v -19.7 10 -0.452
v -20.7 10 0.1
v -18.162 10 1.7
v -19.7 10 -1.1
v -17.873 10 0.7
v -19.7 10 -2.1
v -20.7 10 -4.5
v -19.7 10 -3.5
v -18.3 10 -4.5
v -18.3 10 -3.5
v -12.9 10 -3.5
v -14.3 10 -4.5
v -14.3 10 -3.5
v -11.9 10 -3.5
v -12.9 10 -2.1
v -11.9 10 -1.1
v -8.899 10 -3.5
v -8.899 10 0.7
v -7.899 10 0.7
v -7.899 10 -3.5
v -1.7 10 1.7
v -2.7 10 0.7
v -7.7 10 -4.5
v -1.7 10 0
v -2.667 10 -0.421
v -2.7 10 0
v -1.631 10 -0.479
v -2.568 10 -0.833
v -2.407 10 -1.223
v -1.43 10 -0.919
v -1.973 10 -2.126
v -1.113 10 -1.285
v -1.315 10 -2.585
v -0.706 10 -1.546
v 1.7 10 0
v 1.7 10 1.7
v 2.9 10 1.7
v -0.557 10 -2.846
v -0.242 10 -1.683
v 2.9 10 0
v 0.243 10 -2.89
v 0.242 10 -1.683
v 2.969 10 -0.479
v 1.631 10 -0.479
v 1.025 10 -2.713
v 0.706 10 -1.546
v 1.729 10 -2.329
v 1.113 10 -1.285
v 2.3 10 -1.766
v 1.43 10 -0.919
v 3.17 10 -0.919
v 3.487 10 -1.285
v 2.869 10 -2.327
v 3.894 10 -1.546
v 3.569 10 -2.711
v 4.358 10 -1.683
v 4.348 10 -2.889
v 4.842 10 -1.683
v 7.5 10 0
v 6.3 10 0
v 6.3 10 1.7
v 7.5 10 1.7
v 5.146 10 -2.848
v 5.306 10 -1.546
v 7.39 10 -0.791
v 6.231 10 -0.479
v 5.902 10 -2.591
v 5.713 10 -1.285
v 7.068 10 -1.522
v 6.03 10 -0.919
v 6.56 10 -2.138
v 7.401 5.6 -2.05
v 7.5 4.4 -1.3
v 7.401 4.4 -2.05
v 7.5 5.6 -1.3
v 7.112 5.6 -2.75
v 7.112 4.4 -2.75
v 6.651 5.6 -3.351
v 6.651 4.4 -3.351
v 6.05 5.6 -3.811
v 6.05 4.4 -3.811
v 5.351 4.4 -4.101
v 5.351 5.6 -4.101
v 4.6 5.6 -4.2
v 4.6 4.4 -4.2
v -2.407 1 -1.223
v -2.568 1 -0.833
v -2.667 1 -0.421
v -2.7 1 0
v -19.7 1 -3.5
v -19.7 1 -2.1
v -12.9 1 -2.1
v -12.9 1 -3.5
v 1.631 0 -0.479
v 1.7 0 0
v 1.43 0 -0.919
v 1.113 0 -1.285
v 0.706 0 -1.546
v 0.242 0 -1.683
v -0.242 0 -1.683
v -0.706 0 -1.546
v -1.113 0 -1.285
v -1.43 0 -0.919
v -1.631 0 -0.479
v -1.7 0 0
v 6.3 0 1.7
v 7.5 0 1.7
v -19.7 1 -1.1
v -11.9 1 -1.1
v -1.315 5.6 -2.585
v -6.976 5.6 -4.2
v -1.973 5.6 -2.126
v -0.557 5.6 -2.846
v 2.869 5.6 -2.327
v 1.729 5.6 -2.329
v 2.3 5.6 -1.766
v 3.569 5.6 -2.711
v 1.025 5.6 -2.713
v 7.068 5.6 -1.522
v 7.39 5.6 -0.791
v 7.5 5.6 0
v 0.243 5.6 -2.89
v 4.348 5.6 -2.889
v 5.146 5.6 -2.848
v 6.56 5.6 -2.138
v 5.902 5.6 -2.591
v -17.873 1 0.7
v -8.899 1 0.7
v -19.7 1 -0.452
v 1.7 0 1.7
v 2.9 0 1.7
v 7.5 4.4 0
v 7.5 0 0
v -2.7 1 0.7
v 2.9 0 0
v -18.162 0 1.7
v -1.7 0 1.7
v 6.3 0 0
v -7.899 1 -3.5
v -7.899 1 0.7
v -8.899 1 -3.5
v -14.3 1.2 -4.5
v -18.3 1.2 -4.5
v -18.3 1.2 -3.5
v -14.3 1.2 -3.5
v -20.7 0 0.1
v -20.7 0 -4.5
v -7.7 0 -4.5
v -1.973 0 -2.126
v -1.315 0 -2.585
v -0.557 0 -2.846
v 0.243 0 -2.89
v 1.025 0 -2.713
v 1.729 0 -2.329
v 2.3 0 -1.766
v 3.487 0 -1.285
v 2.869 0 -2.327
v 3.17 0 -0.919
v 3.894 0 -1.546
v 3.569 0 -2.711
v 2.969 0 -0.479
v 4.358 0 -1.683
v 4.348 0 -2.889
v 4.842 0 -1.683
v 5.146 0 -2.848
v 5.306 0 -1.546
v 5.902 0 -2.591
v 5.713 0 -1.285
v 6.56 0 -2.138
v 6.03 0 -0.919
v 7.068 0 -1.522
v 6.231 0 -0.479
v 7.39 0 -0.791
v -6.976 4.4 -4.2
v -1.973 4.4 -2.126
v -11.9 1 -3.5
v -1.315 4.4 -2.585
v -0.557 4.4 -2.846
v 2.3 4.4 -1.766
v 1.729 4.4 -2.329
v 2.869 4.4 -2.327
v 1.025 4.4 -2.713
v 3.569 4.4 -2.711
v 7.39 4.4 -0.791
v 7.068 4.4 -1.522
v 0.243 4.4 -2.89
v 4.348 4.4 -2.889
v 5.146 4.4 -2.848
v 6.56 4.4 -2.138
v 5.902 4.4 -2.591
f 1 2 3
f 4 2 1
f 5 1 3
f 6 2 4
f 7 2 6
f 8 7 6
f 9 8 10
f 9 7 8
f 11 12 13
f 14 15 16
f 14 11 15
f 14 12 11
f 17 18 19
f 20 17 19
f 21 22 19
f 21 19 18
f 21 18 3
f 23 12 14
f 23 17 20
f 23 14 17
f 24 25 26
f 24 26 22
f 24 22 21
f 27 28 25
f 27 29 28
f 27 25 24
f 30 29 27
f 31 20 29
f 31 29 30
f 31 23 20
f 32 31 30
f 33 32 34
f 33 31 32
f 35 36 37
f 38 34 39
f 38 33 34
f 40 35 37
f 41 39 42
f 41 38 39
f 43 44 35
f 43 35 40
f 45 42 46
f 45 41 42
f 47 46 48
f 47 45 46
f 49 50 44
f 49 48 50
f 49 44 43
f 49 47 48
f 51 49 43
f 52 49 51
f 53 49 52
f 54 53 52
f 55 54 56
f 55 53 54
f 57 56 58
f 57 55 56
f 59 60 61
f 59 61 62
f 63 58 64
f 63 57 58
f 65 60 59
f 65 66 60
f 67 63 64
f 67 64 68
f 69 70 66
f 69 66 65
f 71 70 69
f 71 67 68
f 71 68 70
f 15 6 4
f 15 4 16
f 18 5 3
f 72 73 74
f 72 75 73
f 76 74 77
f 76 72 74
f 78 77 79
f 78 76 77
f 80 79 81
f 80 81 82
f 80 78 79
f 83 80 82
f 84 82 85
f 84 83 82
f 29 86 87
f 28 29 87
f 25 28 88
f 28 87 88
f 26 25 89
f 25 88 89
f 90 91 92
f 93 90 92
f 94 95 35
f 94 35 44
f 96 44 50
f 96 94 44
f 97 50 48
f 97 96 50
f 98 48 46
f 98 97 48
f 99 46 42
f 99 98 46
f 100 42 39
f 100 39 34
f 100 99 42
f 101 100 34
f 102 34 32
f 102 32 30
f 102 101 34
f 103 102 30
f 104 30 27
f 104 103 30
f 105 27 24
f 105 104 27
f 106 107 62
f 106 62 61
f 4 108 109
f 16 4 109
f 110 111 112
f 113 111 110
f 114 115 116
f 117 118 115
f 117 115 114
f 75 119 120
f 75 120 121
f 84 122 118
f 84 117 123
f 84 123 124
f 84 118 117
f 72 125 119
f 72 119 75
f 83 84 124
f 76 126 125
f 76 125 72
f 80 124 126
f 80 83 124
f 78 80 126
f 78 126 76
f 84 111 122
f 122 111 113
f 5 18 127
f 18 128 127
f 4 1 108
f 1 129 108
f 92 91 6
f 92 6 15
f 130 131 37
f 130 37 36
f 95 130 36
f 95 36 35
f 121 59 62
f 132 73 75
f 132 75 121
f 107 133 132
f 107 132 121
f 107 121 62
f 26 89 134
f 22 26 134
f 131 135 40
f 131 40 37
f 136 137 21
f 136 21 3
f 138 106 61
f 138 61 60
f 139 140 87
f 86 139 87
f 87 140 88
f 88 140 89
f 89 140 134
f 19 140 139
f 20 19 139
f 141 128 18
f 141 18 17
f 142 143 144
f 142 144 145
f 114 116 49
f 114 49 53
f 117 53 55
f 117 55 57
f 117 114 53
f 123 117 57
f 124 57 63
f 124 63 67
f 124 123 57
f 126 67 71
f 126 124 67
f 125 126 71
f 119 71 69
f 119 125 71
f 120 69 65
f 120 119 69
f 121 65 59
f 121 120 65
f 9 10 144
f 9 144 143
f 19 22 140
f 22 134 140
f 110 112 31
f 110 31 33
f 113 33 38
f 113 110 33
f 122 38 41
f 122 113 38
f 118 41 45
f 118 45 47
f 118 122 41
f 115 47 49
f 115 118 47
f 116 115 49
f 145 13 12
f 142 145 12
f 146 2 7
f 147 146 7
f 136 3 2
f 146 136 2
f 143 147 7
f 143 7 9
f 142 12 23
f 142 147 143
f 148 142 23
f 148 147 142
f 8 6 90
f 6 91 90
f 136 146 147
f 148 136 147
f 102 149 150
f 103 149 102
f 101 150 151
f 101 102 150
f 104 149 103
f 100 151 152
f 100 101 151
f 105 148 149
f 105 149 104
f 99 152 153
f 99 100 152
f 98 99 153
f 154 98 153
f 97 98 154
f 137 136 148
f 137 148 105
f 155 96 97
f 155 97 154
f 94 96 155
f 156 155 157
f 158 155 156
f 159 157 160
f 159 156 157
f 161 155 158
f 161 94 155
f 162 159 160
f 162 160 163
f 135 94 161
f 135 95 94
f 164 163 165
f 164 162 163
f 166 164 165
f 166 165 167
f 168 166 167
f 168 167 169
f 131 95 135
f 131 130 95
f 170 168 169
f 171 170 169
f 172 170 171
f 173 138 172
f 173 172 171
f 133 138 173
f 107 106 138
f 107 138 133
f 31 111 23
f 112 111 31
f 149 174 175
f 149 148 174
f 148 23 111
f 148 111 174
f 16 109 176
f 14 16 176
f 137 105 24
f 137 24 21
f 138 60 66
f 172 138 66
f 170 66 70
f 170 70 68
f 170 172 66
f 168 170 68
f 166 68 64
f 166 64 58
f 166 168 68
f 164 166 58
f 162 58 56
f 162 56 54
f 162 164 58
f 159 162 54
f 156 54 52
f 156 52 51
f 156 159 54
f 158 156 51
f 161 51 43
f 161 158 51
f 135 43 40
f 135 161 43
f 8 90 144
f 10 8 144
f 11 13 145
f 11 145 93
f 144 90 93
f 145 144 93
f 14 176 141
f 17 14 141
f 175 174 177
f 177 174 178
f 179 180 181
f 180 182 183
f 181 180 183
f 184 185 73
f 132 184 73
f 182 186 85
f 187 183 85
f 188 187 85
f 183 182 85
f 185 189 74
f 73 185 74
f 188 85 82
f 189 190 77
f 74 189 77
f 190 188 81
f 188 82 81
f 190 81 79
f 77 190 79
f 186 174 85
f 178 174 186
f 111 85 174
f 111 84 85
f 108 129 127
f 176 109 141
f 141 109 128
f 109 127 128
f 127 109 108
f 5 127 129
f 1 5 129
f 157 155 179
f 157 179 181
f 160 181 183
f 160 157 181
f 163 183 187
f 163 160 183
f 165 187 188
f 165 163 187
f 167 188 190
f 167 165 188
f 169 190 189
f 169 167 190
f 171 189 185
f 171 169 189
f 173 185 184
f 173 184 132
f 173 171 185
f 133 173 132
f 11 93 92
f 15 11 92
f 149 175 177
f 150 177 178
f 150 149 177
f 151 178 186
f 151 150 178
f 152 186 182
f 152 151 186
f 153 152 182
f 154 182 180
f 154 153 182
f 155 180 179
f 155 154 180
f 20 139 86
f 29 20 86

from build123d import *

# Parameters (mm, degrees)
BOSS_EXTRUDE1_DEPTH = 10
BOSS_EXTRUDE2_DEPTH = 10
CUT_EXTRUDE1_DEPTH  = 10
SHELL2_T            = -1
SKETCH4_W           = 1
SKETCH4_H           = 4.2
BOSS_EXTRUDE3_DEPTH = 9
SKETCH7_W           = 6.8
SKETCH7_H           = 1
BOSS_EXTRUDE4_DEPTH = 9
SKETCH8_W           = 4
SKETCH8_H           = 1
CUT_EXTRUDE2_DEPTH  = 8.8
BOSS_EXTRUDE5_DEPTH = 0.6


with BuildPart() as part:
    # Sketch1 → Boss-Extrude1 (new body)
    with BuildSketch(Plane(origin=(0, 0, 0), x_dir=(1, 0, 0), z_dir=(0, 1, 0))):
        with BuildLine():
            ThreePointArc((-2.9, 0), (-0.932737905, 2.745906044), (2.3, 1.766352173))
            ThreePointArc((2.3, 1.766352173), (5.532737905, 2.745906044), (7.5, 0))
            Line((7.5, 0), (7.5, -1.7))
            Line((7.5, -1.7), (6.3, -1.7))
            Line((6.3, -1.7), (6.3, 0))
            ThreePointArc((6.3, 0), (4.6, 1.7), (2.9, 0))
            Line((2.9, 0), (2.9, -1.7))
            Line((2.9, -1.7), (1.7, -1.7))
            Line((1.7, -1.7), (1.7, 0))
            ThreePointArc((1.7, 0), (0, 1.7), (-1.7, 0))
            Line((-1.7, 0), (-1.7, -1.7))
            Line((-1.7, -1.7), (-2.9, -1.7))
            Line((-2.9, -1.7), (-2.9, 0))
        make_face()
    extrude(amount=BOSS_EXTRUDE1_DEPTH)

    # Sketch2 → Boss-Extrude2 (add)
    with BuildSketch(Plane.XZ):
        with BuildLine():
            Line((-2.9, 1.7), (-20.7, 1.7))
            Line((-20.7, 1.7), (-20.7, -4.5))
            Line((-20.7, -4.5), (-7.7, -4.5))
            Line((-7.7, -4.5), (-1.972618929, -2.125740944))
            ThreePointArc((-1.972618929, -2.125740944), (-2.658062724, -1.159613105), (-2.9, 0))
            Line((-2.9, 0), (-2.9, 1.7))
        make_face()
    extrude(amount=-BOSS_EXTRUDE2_DEPTH)

    # Sketch3 → Cut-Extrude1 (cut)
    with BuildSketch(Plane.XZ):
        Polygon((-18.162284492, 1.7), (-20.7, 0.1), (-20.7, 1.7), align=None)
    extrude(amount=-CUT_EXTRUDE1_DEPTH, mode=Mode.SUBTRACT)

    # Shell2
    shell2_openings = [part.faces().sort_by_distance(p)[0] for p in [
        (-2.051423917, 10, -0.549910722),
    ]]
    offset(amount=SHELL2_T, openings=shell2_openings, kind=Kind.INTERSECTION)

    # Sketch4 → Boss-Extrude3 (add)
    with BuildSketch(Plane(origin=(0, 1, 0), x_dir=(1, 0, 0), z_dir=(0, 1, 0))):
        with Locations((-8.399059546, 1.4)):
            Rectangle(SKETCH4_W, SKETCH4_H)
    extrude(amount=BOSS_EXTRUDE3_DEPTH)

    # Sketch7 → Boss-Extrude4 (add)
    with BuildSketch(Plane(origin=(0, 1, 0), x_dir=(1, 0, 0), z_dir=(0, 1, 0))):
        with Locations((-16.3, 1.6)):
            Rectangle(SKETCH7_W, SKETCH7_H)
        Polygon((-11.9, 3.5), (-12.9, 3.5), (-12.9, 2.1), (-12.9, 1.1), (-11.9, 1.1), align=None)
    extrude(amount=BOSS_EXTRUDE4_DEPTH)

    # Sketch8 → Cut-Extrude2 (cut)
    with BuildSketch(Plane(origin=(0, 10, 0), x_dir=(1, 0, 0), z_dir=(0, 1, 0))):
        with Locations((-16.3, 4)):
            Rectangle(SKETCH8_W, SKETCH8_H)
    extrude(amount=-CUT_EXTRUDE2_DEPTH, mode=Mode.SUBTRACT)

    # Sketch9 → Boss-Extrude5 (add, symmetric)
    with BuildSketch(Plane(origin=(0, 5, 0), x_dir=(1, 0, 0), z_dir=(0, 1, 0))):
        with BuildLine():
            Line((0, 4.2), (-6.976315566, 4.2))
            Line((-6.976315566, 4.2), (-1.972618929, 2.125740944))
            ThreePointArc((-1.972618929, 2.125740944), (0.243073371, 2.889795034), (2.3, 1.766352173))
            ThreePointArc((2.3, 1.766352173), (5.532737905, 2.745906044), (7.5, 0))
            Line((7.5, 0), (7.5, 1.299833538))
            ThreePointArc((7.5, 1.299833538), (6.65066852, 3.350550812), (4.6, 4.2))
            Line((4.6, 4.2), (0, 4.2))
        make_face()
    extrude(amount=BOSS_EXTRUDE5_DEPTH, both=True)


solid = part.part
